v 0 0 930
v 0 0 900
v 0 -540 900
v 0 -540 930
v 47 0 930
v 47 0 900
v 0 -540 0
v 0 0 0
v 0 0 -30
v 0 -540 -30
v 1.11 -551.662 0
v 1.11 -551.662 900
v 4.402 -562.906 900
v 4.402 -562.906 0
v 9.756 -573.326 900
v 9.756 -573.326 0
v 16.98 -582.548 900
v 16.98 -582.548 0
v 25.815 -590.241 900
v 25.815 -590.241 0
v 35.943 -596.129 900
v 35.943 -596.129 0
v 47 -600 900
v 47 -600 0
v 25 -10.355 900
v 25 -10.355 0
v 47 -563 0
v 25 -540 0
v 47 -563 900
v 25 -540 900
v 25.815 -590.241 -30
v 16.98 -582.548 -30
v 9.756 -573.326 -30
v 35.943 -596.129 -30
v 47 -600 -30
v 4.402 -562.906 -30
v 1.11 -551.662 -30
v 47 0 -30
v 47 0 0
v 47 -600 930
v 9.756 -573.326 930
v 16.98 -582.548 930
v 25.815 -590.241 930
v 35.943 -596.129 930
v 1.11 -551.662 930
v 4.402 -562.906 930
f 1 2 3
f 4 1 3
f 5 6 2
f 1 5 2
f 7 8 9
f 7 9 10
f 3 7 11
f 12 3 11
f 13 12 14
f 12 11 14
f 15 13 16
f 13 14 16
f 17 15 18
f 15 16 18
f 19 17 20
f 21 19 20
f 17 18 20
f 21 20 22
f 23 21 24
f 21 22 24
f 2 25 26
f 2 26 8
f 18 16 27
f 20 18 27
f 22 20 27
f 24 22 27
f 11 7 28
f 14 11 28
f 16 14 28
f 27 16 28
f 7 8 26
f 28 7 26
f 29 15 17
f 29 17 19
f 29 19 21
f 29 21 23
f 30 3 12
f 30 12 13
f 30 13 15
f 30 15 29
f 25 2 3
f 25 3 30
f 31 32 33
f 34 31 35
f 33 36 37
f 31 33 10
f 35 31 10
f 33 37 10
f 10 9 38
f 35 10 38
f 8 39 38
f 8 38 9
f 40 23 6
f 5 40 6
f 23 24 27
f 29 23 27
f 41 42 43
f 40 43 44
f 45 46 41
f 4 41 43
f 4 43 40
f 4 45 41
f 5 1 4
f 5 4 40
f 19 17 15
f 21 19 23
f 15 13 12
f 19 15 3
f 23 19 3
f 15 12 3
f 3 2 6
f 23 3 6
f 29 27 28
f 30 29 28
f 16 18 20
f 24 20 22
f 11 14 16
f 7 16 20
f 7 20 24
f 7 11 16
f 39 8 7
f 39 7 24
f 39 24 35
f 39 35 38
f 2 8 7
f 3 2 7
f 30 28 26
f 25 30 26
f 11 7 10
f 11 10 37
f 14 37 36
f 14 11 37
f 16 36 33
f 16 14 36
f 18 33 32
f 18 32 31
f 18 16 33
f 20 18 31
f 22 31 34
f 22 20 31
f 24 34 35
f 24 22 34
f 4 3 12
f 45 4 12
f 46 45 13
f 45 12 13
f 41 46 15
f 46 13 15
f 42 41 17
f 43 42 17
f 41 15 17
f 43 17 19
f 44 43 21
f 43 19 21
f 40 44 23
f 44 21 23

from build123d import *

# Parameters (mm, degrees)
F1_DEPTH = 900
F3_DEPTH = 30


with BuildPart() as f1:
    # F0 (on Top) → F1 (new body)
    with BuildSketch(Plane.XY):
        with BuildLine():
            Line((25, -540), (25, -10.355339))
            Line((25, -10.355339), (0, 0))
            Line((0, 0), (0, -540))
            ThreePointArc((0, -540), (13.148854, -578.108398), (47, -600))
            Line((47, -600), (47, -563))
            Line((47, -563), (25, -540))
        make_face()
    extrude(amount=F1_DEPTH)


with BuildPart() as f3:
    # F2 (on face) → F3 (new body)
    with BuildSketch(Plane.XY.offset(900)):
        Polygon((47, 0), (0, 0), (25, -10.355339), (25, -540), (47, -563), align=None)
        with BuildLine():
            Line((25, -10.355339), (0, 0))
            Line((0, 0), (0, -540))
            ThreePointArc((0, -540), (13.148854, -578.108398), (47, -600))
            Line((47, -600), (47, -563))
            Line((47, -563), (25, -540))
            Line((25, -540), (25, -10.355339))
        make_face()
    extrude(amount=F3_DEPTH)


with BuildPart() as f5_1:
    # F5: instance of F3
    add(f3.part.mirror(Plane(origin=(14.064969, -308.163629, 450), x_dir=(1, 0, 0), z_dir=(0, 0, 1))))


solid = Compound([f1.part, f3.part, f5_1.part])
